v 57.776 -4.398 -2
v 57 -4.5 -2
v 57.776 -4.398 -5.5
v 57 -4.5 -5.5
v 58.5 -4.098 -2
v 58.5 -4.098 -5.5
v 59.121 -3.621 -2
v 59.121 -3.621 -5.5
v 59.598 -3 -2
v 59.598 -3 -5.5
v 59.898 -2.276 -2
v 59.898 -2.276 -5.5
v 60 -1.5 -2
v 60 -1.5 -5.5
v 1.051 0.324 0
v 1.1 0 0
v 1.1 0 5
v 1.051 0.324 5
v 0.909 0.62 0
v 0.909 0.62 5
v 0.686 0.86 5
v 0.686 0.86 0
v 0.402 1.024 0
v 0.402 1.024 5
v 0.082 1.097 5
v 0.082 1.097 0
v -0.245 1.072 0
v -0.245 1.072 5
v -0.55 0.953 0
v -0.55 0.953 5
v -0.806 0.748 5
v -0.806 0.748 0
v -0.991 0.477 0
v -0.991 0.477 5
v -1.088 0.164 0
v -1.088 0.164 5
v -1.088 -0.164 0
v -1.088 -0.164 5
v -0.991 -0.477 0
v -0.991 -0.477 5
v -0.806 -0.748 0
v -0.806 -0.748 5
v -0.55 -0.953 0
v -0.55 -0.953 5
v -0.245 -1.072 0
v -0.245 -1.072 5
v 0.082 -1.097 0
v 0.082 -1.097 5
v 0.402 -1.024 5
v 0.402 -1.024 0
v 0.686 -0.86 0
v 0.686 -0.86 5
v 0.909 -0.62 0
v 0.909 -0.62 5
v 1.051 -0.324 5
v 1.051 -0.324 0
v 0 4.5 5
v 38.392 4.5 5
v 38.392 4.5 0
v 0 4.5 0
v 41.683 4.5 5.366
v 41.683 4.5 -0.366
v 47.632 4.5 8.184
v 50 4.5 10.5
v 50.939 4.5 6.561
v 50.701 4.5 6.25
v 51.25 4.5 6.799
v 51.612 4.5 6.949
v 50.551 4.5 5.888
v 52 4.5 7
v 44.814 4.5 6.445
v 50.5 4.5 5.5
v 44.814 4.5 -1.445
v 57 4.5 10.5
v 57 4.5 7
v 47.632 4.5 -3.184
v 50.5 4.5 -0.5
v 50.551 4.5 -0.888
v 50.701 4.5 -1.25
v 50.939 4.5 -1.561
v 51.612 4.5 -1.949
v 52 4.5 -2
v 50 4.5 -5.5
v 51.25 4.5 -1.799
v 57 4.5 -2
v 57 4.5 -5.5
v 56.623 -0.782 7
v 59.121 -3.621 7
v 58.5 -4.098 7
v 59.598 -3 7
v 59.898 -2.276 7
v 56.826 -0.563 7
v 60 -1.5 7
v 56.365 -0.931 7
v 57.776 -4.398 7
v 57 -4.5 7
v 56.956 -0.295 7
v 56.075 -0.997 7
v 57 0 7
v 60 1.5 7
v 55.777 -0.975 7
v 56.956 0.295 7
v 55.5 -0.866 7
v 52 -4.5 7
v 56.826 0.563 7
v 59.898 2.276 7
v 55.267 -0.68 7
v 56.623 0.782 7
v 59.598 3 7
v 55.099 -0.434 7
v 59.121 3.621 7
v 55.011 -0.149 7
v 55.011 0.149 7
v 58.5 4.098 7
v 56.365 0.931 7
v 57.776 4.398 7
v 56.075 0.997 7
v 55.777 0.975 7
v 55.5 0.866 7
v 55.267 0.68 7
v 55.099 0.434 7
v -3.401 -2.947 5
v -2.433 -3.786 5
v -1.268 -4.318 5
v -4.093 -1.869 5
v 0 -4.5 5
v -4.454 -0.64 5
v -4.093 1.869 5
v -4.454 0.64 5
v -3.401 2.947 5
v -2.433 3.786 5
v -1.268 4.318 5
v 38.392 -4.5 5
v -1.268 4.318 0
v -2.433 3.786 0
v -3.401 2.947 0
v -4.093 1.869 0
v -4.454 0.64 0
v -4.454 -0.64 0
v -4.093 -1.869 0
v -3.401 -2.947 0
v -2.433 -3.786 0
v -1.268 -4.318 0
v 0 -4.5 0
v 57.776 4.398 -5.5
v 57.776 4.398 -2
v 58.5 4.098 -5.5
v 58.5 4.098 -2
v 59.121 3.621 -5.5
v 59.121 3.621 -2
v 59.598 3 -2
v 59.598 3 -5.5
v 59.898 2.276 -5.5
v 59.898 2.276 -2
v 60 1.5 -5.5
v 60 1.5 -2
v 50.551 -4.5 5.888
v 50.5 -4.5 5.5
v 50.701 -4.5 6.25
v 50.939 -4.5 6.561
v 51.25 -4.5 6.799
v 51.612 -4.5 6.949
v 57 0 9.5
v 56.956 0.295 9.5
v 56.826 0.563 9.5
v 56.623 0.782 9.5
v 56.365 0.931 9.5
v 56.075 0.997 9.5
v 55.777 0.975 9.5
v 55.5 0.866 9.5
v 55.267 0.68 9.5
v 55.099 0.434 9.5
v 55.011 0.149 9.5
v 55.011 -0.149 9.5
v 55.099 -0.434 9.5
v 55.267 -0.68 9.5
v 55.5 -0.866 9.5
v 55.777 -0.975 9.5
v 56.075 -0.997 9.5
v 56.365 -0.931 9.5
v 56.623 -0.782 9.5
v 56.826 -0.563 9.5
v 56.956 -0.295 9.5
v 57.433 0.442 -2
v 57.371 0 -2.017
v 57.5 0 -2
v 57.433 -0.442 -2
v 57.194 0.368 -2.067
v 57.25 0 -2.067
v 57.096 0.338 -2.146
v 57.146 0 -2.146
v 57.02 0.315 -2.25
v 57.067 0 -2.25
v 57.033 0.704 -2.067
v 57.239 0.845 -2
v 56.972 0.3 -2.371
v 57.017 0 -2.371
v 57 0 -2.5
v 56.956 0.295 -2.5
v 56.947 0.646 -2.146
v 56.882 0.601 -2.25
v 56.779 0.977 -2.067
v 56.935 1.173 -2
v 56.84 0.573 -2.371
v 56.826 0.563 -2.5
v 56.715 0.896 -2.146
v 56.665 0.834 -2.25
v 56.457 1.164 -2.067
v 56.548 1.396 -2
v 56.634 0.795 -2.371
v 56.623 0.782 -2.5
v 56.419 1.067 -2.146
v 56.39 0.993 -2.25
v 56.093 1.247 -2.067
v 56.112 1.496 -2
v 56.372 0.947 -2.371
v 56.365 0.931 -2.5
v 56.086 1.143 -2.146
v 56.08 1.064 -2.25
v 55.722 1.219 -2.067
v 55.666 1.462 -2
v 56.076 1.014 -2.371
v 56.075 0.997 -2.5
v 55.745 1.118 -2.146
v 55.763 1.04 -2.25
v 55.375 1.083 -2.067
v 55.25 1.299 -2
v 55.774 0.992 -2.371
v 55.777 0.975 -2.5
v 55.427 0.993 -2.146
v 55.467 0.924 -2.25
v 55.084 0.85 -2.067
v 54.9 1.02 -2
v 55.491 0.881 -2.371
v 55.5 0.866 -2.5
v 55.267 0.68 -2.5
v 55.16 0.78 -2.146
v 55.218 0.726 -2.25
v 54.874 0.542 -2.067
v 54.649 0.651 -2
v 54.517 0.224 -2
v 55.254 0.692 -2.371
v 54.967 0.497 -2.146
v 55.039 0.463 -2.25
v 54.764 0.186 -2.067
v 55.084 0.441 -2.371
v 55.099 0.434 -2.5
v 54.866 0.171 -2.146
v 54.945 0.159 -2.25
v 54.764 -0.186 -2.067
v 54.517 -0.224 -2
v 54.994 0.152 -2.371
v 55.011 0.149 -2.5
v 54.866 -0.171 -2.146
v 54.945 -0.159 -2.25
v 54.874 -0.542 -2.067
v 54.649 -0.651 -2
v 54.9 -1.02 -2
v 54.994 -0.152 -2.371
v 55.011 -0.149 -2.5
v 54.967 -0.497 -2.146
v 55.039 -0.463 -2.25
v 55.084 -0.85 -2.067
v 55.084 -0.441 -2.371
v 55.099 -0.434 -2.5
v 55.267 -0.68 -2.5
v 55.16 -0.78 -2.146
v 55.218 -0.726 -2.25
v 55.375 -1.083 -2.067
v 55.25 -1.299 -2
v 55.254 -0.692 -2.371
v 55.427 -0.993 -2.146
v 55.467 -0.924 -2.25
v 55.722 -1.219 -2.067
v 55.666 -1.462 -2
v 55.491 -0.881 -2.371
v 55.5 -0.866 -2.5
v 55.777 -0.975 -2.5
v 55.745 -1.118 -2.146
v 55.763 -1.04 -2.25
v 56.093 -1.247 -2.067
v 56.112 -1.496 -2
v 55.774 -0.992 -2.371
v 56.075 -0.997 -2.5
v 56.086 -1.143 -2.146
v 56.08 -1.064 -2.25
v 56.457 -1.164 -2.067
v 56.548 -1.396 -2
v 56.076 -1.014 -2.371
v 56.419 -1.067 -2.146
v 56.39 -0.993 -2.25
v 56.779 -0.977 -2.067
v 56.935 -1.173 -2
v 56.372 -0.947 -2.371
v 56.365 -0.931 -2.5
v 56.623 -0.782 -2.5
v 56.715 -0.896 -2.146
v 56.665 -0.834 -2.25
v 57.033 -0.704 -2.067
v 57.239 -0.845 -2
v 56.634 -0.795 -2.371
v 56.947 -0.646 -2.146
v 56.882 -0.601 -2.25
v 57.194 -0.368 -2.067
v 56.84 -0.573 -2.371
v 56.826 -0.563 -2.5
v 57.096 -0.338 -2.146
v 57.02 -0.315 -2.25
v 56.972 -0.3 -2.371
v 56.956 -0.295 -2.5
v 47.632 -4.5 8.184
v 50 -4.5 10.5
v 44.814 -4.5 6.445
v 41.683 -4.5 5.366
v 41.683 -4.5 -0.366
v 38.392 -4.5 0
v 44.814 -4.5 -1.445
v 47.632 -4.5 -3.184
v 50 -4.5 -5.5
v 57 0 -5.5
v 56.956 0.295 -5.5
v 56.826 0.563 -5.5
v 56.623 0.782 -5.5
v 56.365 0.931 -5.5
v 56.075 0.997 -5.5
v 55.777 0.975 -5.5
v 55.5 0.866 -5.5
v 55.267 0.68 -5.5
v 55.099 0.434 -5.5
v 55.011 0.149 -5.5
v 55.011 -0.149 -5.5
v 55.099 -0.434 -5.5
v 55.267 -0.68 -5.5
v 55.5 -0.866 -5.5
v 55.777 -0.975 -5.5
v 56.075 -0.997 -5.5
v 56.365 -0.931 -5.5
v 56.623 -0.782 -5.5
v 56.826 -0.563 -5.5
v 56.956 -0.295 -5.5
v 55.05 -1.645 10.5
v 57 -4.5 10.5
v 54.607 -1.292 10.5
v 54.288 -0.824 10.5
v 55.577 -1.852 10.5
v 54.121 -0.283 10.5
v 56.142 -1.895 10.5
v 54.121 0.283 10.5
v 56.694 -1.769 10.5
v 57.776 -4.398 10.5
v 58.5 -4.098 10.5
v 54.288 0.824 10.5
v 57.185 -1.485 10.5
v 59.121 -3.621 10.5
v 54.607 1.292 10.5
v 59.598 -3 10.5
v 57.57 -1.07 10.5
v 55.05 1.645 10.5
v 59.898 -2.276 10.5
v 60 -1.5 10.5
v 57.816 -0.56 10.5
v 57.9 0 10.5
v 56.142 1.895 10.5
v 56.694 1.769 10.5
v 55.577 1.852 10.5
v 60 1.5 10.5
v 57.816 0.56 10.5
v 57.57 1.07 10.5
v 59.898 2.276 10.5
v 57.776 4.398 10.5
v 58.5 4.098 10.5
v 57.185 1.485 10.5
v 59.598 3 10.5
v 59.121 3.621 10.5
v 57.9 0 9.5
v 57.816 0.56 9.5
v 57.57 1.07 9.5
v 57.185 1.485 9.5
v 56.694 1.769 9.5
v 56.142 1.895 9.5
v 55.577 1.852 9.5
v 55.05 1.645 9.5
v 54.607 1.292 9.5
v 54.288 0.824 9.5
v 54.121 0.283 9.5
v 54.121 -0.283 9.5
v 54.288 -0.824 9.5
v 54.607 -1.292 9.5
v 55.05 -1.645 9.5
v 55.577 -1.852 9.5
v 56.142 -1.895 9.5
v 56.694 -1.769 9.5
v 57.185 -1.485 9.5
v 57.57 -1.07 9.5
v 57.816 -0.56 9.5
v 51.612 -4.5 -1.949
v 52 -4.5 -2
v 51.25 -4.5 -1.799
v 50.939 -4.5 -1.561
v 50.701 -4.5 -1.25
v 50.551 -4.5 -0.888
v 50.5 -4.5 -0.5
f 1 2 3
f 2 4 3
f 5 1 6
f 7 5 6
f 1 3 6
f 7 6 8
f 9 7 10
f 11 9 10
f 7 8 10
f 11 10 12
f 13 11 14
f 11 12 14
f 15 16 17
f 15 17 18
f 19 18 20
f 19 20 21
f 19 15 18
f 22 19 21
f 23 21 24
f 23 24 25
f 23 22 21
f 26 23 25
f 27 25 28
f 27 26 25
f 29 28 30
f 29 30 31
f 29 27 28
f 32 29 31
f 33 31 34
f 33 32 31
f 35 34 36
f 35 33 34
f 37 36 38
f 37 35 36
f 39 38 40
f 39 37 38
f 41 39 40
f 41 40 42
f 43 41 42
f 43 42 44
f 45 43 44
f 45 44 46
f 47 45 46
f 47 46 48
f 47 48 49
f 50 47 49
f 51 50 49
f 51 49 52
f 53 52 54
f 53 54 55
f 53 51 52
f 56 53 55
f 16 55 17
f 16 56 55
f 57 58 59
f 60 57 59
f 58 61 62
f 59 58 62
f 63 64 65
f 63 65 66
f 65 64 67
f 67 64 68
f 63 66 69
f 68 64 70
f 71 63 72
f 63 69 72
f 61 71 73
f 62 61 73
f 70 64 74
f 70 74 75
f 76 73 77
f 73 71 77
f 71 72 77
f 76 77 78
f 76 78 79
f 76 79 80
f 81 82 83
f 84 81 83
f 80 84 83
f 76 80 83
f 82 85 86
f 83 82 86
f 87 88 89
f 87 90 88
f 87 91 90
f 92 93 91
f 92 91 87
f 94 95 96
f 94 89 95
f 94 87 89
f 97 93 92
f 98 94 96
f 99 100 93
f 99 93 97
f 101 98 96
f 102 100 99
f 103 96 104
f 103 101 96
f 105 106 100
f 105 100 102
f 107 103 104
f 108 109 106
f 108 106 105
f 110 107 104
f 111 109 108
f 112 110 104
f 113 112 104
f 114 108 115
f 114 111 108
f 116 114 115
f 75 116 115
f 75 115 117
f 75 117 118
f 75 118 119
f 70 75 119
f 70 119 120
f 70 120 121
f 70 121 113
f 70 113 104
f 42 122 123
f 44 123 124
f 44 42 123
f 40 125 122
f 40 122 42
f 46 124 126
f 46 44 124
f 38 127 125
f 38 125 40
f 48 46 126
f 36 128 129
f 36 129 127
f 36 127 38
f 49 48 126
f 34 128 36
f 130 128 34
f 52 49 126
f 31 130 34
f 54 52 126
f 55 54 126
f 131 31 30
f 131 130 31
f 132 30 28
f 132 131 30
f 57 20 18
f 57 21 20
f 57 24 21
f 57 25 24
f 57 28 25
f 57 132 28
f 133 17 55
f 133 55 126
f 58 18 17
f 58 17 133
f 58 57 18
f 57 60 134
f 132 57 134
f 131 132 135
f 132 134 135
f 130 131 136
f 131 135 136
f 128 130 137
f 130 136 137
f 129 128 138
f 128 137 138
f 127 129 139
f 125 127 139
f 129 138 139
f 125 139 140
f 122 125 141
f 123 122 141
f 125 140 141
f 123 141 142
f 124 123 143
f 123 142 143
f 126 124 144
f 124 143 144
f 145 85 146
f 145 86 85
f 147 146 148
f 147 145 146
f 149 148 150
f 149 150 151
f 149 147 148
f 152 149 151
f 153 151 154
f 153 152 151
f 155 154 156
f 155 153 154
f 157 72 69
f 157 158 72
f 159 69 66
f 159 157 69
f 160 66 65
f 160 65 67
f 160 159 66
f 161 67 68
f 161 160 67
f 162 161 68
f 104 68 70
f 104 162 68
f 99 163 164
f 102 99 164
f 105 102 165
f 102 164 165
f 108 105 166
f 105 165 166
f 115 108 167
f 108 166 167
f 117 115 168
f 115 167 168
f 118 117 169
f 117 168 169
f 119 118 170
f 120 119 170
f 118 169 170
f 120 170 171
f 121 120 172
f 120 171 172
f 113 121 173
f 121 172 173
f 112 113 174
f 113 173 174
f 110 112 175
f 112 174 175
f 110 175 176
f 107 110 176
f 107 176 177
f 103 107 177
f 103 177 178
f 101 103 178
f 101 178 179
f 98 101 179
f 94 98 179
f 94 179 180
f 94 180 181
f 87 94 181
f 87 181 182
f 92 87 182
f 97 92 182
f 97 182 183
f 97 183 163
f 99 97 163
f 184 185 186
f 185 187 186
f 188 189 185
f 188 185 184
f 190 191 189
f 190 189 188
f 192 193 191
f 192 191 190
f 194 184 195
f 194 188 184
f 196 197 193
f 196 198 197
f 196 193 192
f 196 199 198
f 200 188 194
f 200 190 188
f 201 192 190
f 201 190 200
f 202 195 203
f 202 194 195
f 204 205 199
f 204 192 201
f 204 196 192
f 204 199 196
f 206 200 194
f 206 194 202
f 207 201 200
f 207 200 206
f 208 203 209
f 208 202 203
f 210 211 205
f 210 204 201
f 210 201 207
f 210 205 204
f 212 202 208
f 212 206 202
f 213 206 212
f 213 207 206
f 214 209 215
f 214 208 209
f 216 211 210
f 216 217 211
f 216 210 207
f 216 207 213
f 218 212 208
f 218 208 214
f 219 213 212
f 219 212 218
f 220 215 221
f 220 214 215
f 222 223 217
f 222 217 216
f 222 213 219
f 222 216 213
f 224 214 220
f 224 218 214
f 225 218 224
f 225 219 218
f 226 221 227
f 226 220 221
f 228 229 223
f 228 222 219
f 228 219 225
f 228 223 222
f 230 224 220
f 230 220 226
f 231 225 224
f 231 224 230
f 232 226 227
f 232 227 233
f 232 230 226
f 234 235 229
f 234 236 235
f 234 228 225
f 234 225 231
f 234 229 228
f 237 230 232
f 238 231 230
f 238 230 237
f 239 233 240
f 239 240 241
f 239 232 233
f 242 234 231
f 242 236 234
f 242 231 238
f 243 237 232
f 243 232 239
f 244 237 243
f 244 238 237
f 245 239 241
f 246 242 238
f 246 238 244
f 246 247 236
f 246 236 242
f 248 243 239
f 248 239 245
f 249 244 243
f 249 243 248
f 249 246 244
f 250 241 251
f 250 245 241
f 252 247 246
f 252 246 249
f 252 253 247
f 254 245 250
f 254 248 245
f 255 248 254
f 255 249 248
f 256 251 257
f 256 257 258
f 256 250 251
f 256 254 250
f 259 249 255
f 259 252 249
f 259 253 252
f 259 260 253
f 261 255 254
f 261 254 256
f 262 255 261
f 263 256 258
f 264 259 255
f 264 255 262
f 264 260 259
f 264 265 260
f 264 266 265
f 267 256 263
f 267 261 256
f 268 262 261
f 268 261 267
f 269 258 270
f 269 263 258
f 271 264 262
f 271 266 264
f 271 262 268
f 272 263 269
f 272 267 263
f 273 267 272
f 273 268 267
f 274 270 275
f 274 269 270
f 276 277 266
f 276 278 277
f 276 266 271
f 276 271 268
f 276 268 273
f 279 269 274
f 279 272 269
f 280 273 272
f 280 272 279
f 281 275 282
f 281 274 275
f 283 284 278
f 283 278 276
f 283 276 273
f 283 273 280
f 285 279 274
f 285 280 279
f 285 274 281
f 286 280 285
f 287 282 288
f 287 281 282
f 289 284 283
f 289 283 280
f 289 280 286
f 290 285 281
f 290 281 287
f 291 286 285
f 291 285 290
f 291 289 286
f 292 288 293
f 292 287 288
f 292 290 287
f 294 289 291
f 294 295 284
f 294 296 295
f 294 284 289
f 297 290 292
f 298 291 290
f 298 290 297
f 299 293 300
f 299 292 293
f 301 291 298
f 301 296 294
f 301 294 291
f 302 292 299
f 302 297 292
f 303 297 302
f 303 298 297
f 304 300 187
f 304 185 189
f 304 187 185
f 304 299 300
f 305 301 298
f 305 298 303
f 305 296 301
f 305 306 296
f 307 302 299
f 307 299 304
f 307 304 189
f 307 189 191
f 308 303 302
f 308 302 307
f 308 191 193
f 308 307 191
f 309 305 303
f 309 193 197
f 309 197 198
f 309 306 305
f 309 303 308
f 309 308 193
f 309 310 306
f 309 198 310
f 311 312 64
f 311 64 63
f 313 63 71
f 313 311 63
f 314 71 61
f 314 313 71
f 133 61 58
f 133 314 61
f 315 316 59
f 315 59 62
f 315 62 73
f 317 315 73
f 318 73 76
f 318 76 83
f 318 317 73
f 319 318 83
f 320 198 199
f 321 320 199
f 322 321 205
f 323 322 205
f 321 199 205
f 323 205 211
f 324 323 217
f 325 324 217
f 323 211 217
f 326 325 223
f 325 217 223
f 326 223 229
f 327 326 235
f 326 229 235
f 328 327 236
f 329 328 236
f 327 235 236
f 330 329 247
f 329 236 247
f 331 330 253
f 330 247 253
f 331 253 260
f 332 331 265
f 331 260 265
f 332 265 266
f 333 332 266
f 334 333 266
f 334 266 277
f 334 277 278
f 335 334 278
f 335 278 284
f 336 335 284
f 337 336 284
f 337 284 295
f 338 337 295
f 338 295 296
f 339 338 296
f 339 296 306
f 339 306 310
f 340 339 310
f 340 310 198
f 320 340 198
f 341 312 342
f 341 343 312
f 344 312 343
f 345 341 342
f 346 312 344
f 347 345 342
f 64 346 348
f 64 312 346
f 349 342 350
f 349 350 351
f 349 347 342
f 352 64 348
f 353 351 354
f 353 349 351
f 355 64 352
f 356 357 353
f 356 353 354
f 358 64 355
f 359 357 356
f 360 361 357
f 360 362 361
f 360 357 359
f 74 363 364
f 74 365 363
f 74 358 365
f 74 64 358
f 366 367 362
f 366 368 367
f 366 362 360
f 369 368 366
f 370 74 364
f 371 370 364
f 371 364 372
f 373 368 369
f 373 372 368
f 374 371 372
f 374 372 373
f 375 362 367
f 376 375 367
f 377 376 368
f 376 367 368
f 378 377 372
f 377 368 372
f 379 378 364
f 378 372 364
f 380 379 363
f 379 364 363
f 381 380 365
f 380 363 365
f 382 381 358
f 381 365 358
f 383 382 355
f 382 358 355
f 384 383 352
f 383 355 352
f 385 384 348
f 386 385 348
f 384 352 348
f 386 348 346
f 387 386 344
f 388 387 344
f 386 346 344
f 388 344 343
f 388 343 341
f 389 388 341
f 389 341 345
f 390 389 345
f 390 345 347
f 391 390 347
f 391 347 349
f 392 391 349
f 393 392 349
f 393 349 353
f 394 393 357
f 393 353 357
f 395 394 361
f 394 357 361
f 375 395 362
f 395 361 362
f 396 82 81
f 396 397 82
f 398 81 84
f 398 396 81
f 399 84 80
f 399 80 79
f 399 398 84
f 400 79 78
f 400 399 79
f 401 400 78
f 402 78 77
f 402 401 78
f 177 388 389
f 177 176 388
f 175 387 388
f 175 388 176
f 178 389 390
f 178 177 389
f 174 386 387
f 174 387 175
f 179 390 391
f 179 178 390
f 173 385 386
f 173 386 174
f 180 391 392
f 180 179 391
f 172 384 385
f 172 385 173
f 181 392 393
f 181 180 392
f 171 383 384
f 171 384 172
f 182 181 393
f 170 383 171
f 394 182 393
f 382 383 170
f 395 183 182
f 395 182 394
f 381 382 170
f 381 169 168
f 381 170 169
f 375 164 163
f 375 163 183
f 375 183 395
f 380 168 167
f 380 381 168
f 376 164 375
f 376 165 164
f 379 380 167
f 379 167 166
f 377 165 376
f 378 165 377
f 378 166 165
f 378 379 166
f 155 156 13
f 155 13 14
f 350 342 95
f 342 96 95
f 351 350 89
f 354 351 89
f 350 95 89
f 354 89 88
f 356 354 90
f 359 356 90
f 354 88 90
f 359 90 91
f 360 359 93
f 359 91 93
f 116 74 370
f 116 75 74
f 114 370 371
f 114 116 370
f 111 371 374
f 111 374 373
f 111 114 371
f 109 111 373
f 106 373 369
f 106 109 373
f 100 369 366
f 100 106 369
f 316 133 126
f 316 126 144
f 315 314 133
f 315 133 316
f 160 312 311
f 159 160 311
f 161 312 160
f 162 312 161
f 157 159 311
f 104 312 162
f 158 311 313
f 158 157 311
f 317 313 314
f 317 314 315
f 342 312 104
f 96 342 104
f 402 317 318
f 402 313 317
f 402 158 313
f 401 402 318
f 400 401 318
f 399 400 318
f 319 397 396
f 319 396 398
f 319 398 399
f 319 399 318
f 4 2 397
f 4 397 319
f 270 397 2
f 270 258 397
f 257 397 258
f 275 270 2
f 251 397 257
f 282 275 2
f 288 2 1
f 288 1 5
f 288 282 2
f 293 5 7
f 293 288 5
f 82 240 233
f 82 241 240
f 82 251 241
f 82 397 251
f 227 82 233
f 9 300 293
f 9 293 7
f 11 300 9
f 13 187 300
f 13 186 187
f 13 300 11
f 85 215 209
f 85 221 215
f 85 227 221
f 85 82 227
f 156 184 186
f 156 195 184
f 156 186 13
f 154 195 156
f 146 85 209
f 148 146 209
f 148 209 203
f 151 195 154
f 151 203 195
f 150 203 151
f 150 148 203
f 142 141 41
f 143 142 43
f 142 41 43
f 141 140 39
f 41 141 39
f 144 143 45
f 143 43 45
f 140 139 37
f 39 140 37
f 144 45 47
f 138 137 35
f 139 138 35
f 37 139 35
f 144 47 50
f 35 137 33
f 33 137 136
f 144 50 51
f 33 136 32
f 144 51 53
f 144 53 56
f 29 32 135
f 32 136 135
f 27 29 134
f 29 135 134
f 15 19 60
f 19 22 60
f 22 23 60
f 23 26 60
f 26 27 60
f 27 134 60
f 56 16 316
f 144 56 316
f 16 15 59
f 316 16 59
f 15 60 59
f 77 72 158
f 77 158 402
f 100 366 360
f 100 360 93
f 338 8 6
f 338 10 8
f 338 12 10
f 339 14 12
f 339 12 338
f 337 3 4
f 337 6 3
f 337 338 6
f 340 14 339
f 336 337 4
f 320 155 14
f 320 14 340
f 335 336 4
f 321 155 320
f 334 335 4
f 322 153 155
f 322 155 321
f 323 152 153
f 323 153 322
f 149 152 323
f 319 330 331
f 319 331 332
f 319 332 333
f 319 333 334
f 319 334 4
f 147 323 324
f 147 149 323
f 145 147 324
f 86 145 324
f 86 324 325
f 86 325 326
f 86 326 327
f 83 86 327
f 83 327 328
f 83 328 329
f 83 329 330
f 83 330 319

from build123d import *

# Parameters (mm, degrees)
SKETCH1_R           = 1.1
BOSS_EXTRUDE1_DEPTH = 5
BOSS_EXTRUDE2_DEPTH = 9
FILLET1_R           = 15
SKETCH3_R           = 1
CUT_EXTRUDE1_DEPTH  = 16
FILLET2_R           = 3
SKETCH4_R           = 1.9
CUT_EXTRUDE2_DEPTH  = 1
FILLET3_R           = 1.5
FILLET4_R           = 0.5


with BuildPart() as part:
    # Sketch1 → Boss-Extrude1 (new body)
    with BuildSketch(Plane.XY):
        with BuildLine():
            ThreePointArc((0, 4.5), (-4.5, 0), (0, -4.5))
            Line((0, -4.5), (50, -4.5))
            Line((50, -4.5), (50, 4.5))
            Line((50, 4.5), (0, 4.5))
        make_face()
        Circle(SKETCH1_R, mode=Mode.SUBTRACT)
    extrude(amount=BOSS_EXTRUDE1_DEPTH)

    # Sketch2 → Boss-Extrude2 (add)
    with BuildSketch(Plane(origin=(0, 4.5, 0), x_dir=(1, 0, 0), z_dir=(0, 1, 0))):
        Polygon((50.5, 2), (60, 2), (60, 5.5), (50, 5.5), (50, 0), (50, -5), (50, -10.5), (60, -10.5), (60, -7), (50.5, -7), align=None)
    extrude(amount=-BOSS_EXTRUDE2_DEPTH)

    # Fillet1
    # the kernel refuses this fillet: 15 mm, written as the material it adds along each edge
    with BuildSketch(Plane(origin=(50, -4.5, 0), x_dir=(0, 0, -1), z_dir=(0, 1, 0))) as fillet1_piece_1:
        with BuildLine():
            CenterArc((15, 11.608186766), FILLET1_R, 180, 50.703519761)
            Line((0, 11.608186766), (-0.3, 11.608186766))
            Line((-0.3, 11.608186766), (-0.3, 0))
            Line((-0.3, 0), (0, -0.3))
            ThreePointArc((0, -0.3), (2.75, -0.3), (5.31, -0.232163735))
            Line((5.31, -0.232163735), (5.5, 0))
        make_face()
    extrude(amount=9)
    with BuildSketch(Plane(origin=(50, -4.5, 5), x_dir=(0, 0, 1), z_dir=(0, 1, 0))) as fillet1_piece_2:
        with BuildLine():
            CenterArc((15, -11.608186766), FILLET1_R, 129.296480239, 50.703519761)
            Line((0, -11.608186766), (-0.3, -11.608186766))
            Line((-0.3, -11.608186766), (-0.3, 0))
            Line((-0.3, 0), (0, 0.3))
            ThreePointArc((0, 0.3), (2.75, 0.3), (5.31, 0.232163735))
            Line((5.31, 0.232163735), (5.5, 0))
        make_face()
    extrude(amount=9)

    # Sketch3 → Cut-Extrude1 (cut)
    with BuildSketch(Plane.XY.offset(10.5)):
        with Locations((56, 0)):
            Circle(SKETCH3_R)
    extrude(amount=-CUT_EXTRUDE1_DEPTH, mode=Mode.SUBTRACT)

    # Fillet2
    fillet2_edges = [part.edges().sort_by_distance(p)[0] for p in [
        (60, 4.5, 8.75),
        (60, 4.5, -3.75),
        (60, -4.5, 8.75),
        (60, -4.5, -3.75),
    ]]
    fillet(fillet2_edges, radius=FILLET2_R)

    # Sketch4 → Cut-Extrude2 (cut)
    with BuildSketch(Plane.XY.offset(10.5)):
        with Locations((56, 0)):
            Circle(SKETCH4_R)
    extrude(amount=-CUT_EXTRUDE2_DEPTH, mode=Mode.SUBTRACT)

    # Fillet3
    fillet3_edges = [part.edges().sort_by_distance(p)[0] for p in [
        (50.5, 0, 7),
        (50.5, 0, -2),
    ]]
    fillet(fillet3_edges, radius=FILLET3_R)

    # Fillet4
    fillet4_edges = [part.edges().sort_by_distance(p)[0] for p in [
        (55, 0, -2),
    ]]
    fillet(fillet4_edges, radius=FILLET4_R)


solid = part.part
